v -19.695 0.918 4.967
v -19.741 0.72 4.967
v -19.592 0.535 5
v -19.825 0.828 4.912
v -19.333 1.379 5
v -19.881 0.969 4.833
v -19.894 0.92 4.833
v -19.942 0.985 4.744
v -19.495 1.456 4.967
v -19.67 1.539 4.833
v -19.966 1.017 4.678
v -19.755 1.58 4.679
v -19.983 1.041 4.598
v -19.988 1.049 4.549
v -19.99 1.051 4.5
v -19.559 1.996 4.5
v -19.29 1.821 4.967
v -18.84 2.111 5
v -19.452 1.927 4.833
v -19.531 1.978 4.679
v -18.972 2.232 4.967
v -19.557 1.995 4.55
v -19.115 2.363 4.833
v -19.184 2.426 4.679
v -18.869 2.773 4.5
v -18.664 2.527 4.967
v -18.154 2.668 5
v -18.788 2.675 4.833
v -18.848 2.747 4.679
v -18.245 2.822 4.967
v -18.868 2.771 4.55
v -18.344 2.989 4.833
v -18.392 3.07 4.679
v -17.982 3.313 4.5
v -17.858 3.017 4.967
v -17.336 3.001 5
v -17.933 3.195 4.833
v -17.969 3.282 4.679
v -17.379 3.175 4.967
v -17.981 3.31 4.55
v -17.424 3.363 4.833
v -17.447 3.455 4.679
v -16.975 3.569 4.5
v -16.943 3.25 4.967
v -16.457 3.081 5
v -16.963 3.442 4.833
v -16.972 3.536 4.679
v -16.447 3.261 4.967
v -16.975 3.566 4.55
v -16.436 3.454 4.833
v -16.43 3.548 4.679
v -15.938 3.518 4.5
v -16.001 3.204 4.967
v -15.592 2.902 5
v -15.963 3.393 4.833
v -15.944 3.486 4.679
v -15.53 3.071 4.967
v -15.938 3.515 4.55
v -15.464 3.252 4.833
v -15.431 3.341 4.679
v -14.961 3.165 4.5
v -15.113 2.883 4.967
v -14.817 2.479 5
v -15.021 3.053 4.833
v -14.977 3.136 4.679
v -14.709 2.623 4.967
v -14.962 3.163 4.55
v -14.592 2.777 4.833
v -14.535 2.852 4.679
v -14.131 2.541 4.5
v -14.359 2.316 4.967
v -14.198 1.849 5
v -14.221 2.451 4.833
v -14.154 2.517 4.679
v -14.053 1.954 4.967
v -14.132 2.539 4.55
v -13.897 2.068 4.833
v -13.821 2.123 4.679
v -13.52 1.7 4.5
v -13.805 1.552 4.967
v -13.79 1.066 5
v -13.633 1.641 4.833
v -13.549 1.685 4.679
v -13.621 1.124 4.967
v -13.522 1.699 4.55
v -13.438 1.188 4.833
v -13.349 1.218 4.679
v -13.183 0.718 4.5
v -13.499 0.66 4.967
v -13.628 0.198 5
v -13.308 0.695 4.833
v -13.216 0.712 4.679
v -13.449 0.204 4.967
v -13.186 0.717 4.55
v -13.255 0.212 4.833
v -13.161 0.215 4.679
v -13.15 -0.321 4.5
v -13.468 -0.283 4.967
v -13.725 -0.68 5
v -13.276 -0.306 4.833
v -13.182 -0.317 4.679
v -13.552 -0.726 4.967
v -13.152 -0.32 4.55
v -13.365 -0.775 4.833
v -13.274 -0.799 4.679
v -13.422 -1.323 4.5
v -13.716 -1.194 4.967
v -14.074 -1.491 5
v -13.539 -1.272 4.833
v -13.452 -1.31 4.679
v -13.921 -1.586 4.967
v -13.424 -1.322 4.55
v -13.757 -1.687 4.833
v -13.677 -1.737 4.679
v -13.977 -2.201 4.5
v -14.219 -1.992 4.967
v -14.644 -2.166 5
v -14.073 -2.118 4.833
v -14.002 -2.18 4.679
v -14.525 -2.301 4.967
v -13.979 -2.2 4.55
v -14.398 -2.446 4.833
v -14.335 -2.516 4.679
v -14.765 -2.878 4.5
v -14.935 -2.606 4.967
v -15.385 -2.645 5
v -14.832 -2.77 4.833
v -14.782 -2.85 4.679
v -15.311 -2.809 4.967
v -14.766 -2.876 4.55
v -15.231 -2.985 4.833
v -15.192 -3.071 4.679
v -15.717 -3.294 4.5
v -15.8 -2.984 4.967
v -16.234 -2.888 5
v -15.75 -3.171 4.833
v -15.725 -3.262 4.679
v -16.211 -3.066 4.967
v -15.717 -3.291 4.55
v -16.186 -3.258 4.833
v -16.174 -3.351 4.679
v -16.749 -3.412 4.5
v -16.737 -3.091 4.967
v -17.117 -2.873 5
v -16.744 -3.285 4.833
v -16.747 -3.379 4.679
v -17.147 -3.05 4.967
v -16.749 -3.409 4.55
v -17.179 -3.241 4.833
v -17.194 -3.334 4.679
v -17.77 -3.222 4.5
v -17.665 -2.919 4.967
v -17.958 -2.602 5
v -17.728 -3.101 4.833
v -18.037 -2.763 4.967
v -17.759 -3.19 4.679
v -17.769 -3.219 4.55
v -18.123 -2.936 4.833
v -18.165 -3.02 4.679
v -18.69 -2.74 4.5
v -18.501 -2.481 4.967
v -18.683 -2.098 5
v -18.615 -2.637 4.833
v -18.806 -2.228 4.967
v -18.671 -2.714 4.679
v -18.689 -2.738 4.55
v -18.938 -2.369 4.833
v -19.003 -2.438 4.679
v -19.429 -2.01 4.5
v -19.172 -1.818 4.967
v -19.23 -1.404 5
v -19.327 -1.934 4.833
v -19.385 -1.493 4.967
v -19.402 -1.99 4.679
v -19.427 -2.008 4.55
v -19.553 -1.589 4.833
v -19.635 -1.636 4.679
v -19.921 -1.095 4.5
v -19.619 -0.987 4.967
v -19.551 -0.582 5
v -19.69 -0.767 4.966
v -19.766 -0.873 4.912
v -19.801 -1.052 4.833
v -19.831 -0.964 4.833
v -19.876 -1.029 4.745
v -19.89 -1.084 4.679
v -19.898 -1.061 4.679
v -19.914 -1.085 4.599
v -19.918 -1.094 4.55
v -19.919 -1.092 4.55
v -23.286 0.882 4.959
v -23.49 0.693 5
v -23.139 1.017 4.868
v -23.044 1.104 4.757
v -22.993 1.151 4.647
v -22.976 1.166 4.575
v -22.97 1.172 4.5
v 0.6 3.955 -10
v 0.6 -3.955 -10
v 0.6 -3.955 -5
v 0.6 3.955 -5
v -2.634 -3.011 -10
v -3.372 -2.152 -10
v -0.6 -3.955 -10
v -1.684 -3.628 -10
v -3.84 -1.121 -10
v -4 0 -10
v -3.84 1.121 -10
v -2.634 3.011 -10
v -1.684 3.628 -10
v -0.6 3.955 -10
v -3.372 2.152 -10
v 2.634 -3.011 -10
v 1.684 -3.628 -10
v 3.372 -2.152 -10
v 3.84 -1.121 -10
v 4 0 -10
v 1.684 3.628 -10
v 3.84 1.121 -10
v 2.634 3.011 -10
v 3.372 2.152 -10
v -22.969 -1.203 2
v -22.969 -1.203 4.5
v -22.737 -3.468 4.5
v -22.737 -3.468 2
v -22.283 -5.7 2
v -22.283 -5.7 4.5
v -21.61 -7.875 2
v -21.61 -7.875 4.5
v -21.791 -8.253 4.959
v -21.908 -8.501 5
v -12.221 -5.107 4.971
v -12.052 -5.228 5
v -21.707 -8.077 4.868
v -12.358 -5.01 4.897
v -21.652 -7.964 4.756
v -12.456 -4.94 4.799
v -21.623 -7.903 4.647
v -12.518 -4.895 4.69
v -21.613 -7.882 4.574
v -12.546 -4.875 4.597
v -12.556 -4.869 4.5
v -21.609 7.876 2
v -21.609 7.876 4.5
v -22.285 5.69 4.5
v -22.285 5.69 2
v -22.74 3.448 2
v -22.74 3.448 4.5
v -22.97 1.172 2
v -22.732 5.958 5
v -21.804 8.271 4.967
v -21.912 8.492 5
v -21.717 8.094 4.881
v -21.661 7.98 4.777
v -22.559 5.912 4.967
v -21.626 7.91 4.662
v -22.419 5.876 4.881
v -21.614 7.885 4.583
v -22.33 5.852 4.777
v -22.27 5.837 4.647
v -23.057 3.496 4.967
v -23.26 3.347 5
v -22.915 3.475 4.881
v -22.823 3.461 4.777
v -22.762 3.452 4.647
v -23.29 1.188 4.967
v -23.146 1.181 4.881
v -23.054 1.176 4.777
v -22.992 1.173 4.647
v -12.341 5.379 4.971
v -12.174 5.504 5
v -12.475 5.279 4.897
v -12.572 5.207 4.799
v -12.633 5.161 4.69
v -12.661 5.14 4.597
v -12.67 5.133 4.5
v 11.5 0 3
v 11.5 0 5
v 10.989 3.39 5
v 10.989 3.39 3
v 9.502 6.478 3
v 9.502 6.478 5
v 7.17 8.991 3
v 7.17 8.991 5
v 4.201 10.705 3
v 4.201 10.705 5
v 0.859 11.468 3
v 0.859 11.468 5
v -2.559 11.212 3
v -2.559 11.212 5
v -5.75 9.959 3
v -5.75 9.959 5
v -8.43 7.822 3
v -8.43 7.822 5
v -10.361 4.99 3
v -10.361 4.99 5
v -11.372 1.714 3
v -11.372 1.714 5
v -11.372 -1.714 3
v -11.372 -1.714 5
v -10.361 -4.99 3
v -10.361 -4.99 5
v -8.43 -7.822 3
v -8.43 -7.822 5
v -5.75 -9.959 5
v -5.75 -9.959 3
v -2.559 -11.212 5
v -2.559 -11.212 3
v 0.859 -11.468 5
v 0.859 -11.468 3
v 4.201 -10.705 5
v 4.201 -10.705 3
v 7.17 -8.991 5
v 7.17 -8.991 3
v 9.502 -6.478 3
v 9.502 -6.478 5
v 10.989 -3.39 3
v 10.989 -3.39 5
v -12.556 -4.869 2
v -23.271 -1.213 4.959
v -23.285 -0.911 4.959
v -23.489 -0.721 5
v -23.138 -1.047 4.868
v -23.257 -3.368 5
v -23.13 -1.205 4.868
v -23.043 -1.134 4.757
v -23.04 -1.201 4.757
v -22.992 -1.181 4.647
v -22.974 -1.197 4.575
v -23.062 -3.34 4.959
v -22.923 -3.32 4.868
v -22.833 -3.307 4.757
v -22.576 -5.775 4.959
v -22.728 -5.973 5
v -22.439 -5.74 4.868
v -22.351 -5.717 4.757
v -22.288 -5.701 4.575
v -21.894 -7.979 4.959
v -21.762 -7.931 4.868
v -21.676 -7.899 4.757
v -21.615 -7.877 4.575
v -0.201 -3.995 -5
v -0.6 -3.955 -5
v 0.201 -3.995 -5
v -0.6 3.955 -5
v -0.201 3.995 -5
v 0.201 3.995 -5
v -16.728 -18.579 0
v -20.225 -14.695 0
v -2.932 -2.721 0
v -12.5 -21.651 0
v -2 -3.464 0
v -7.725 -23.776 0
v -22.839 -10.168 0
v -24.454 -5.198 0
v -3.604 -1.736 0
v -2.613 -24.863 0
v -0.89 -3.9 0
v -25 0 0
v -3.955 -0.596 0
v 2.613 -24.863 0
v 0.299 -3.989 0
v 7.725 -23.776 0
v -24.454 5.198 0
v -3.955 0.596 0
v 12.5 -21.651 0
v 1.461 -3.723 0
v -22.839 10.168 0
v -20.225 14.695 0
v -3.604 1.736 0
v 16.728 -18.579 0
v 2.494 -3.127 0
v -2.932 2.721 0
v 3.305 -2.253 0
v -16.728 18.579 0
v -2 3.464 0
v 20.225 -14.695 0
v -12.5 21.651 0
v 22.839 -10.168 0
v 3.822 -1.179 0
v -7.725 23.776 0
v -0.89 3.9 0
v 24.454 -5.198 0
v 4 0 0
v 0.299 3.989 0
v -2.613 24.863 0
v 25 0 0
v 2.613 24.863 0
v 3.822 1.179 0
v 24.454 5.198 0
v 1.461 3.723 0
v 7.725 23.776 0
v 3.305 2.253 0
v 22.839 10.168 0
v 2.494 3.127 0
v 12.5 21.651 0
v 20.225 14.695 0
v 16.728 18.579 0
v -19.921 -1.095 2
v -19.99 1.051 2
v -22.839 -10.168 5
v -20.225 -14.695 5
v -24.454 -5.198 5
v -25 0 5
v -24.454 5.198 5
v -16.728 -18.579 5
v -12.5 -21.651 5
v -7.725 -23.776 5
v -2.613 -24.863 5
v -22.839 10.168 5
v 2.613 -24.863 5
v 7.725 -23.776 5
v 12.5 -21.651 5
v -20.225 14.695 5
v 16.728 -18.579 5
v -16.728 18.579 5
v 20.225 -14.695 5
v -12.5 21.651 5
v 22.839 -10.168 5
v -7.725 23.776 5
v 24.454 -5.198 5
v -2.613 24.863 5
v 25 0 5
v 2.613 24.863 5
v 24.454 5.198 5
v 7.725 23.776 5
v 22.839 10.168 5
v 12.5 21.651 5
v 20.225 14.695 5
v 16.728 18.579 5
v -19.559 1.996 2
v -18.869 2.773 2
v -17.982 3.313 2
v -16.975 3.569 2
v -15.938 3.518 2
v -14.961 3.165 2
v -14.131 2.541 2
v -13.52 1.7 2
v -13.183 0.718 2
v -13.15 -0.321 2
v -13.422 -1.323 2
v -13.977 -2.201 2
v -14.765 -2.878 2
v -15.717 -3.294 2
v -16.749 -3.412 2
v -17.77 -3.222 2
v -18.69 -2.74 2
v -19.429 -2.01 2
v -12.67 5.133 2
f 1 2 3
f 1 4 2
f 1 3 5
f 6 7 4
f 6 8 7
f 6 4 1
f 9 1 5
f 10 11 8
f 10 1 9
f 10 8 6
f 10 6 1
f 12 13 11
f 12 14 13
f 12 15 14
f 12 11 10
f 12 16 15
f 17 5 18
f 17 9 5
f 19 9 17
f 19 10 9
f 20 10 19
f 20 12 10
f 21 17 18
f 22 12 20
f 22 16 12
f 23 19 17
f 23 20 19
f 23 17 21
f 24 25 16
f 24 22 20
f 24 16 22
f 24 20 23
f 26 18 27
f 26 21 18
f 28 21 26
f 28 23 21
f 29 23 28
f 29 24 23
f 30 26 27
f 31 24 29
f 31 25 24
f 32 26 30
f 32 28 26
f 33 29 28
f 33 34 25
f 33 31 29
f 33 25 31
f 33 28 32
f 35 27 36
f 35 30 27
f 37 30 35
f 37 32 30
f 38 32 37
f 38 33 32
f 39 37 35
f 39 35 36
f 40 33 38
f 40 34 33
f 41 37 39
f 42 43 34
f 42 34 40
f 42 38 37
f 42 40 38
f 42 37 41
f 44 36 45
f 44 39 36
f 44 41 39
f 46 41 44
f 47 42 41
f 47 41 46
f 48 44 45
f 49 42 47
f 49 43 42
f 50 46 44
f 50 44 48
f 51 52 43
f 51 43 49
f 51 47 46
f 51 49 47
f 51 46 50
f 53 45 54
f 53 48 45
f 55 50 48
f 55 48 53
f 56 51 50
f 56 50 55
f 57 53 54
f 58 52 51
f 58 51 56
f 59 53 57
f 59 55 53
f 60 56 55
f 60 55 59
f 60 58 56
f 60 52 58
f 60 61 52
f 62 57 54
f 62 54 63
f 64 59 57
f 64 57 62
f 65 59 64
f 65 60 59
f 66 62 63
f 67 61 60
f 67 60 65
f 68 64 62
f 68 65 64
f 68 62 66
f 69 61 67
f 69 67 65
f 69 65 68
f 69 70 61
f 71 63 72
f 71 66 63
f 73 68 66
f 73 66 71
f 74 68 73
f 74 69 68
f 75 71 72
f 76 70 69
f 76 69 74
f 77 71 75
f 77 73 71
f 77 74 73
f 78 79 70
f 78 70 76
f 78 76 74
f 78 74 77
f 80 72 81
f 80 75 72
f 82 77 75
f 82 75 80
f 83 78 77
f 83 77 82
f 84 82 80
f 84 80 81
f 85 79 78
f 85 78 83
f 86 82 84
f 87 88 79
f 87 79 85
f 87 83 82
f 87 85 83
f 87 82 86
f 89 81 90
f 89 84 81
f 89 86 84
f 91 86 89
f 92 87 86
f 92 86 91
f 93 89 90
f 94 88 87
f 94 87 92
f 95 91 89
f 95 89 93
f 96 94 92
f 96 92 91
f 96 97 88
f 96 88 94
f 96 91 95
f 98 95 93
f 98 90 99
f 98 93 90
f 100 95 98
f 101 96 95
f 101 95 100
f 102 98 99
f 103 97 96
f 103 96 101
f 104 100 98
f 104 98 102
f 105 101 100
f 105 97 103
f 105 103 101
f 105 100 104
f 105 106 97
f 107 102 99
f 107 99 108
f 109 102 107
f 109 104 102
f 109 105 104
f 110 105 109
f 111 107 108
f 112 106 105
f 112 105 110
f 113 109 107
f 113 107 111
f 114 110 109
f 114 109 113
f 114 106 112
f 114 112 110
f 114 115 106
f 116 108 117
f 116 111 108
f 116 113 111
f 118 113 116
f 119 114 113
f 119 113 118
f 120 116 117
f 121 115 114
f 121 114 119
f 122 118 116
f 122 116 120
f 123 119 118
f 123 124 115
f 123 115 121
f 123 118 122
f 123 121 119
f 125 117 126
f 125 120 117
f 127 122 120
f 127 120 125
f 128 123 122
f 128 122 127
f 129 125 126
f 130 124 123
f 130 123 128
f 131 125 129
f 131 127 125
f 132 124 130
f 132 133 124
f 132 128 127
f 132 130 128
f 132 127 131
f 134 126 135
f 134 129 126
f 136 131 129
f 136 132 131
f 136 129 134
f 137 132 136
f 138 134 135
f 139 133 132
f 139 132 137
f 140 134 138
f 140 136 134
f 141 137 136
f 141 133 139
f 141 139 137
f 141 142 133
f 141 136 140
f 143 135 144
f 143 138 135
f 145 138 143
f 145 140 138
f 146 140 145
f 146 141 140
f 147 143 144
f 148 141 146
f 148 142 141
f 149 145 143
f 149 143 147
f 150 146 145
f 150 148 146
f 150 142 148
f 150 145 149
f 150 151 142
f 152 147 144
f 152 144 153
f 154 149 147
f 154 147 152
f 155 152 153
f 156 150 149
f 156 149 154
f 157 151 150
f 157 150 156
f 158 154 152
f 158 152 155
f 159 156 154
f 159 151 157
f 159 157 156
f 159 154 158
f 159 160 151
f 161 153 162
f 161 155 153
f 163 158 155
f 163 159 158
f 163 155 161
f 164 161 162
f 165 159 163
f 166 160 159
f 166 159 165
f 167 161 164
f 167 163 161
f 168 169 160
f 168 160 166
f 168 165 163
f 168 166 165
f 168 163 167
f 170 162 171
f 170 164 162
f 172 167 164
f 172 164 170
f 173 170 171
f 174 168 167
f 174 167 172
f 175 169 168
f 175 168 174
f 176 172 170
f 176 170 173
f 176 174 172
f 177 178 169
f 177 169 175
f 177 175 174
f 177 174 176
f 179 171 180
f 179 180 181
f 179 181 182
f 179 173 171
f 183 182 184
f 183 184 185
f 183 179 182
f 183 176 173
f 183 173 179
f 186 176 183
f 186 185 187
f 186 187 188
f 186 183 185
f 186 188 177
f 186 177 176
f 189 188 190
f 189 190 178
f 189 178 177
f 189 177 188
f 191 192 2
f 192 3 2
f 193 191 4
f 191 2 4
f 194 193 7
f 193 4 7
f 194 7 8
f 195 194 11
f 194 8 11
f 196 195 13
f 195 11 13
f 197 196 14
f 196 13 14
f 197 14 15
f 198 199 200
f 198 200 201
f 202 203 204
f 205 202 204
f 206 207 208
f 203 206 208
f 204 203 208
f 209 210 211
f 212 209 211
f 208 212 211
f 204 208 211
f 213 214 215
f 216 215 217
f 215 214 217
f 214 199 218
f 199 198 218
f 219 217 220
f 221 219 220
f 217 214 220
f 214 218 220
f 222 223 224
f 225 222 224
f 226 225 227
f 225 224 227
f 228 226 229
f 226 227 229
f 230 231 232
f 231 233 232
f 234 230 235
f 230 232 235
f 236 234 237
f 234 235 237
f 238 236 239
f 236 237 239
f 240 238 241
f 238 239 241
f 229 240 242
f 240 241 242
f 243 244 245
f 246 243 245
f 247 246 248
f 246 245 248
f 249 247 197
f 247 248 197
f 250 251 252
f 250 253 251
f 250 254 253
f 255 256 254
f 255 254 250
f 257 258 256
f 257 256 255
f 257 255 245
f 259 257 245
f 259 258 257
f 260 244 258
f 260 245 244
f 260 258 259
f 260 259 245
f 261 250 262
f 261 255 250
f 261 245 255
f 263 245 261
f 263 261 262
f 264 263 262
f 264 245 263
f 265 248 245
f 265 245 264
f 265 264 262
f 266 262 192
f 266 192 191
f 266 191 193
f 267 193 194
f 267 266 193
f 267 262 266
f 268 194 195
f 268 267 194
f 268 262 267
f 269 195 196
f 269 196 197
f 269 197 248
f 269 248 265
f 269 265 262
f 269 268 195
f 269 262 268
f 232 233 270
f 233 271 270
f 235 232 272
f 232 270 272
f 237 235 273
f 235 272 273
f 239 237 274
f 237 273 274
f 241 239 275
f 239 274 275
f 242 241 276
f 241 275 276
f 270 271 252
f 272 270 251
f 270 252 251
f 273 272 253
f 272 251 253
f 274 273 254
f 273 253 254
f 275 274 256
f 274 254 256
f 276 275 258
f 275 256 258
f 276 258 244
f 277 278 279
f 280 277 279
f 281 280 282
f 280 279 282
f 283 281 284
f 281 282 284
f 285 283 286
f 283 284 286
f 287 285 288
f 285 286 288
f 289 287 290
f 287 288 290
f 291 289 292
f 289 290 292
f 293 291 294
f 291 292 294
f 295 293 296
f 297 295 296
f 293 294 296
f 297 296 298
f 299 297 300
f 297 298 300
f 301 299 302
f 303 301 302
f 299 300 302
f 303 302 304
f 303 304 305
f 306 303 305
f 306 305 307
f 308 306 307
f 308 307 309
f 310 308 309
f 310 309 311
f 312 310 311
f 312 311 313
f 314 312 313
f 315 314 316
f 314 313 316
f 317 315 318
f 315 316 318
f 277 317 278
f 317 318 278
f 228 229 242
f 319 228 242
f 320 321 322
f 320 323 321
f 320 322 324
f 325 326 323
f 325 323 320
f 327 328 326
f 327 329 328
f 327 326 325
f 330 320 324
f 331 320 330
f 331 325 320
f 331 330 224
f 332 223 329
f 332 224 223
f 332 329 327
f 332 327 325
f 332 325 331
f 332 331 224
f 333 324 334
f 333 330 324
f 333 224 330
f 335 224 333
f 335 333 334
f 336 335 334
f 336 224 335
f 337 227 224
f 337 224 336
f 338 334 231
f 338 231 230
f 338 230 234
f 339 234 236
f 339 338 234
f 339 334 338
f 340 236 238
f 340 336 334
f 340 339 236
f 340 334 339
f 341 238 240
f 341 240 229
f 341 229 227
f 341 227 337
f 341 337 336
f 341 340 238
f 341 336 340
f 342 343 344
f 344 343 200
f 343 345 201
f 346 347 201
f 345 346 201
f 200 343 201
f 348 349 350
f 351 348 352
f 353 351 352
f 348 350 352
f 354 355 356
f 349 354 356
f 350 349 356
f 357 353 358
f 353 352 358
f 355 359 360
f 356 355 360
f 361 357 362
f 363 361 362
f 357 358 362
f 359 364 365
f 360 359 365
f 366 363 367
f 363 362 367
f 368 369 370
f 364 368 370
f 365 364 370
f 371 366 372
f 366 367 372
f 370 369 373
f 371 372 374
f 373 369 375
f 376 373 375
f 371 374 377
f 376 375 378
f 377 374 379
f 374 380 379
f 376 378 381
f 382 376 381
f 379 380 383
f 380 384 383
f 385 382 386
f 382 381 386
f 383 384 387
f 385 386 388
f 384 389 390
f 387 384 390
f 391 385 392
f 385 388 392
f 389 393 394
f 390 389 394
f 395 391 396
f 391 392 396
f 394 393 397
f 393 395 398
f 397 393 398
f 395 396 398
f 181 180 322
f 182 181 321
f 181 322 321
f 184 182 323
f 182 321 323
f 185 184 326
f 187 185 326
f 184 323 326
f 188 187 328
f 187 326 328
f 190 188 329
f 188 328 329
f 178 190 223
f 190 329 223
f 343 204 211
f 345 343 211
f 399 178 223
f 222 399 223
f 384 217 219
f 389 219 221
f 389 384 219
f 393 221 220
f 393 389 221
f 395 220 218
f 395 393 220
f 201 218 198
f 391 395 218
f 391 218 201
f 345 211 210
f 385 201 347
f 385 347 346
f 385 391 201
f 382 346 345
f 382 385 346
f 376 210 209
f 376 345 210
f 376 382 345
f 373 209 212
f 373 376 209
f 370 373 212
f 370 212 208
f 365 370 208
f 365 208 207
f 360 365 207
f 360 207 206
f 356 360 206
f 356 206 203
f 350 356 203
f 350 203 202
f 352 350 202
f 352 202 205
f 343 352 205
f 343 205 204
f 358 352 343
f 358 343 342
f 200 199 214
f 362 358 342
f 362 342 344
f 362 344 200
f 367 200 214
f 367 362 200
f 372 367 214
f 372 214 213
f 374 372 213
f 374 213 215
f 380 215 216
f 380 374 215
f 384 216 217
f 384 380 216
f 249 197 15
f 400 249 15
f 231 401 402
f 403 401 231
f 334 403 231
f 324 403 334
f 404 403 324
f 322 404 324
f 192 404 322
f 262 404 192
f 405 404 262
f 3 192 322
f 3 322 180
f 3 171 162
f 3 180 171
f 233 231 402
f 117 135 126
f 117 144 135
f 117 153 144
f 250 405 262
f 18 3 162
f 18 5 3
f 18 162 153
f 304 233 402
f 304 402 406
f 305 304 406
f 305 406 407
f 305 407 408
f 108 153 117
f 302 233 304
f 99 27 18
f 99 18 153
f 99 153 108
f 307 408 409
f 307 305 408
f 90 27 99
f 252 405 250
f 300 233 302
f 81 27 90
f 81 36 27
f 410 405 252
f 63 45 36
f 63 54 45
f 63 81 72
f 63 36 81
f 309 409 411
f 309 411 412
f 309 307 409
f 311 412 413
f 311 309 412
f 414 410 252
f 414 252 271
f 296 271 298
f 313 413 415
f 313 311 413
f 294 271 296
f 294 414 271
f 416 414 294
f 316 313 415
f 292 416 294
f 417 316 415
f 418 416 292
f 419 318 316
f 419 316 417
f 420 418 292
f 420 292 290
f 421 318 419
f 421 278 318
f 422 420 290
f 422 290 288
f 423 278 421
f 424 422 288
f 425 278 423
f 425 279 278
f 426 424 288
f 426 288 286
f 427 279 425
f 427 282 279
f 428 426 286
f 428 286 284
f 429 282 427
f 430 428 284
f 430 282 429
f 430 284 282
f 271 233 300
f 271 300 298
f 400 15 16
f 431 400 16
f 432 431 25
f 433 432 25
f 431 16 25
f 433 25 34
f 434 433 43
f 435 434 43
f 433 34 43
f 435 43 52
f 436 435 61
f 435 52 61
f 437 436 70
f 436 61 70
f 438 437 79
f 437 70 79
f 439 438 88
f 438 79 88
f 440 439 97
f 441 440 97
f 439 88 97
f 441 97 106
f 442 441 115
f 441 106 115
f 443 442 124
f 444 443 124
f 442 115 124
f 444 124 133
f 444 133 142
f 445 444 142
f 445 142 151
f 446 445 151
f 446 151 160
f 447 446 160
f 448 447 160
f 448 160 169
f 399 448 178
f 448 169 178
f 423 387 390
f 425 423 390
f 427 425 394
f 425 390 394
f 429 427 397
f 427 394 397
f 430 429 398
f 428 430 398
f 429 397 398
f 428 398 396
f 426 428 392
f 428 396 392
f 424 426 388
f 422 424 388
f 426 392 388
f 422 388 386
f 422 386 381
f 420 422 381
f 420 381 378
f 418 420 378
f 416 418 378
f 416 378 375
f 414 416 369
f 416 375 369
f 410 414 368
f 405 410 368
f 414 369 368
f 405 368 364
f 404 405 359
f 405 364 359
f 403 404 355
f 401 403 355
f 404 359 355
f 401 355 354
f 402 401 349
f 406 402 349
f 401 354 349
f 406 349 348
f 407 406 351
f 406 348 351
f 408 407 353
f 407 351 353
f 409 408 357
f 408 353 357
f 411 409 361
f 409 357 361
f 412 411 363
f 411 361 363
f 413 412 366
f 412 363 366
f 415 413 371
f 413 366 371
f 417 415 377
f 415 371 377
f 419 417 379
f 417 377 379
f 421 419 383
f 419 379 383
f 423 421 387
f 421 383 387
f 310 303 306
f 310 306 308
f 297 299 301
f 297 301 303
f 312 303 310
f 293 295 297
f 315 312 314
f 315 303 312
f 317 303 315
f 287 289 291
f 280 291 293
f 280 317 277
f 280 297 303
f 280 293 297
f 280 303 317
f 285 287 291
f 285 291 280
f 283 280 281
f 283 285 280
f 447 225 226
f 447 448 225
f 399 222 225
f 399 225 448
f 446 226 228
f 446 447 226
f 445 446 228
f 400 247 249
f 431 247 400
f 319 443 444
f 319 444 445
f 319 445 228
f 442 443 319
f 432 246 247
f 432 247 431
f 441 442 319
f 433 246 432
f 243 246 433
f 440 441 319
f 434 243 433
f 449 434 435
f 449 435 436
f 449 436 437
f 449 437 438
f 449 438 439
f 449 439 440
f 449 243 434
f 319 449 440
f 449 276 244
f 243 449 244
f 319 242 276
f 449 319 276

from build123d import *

# Parameters (mm, degrees)
SKETCH1_R           = 25
BOSS_EXTRUDE1_DEPTH = 5
CUT_EXTRUDE1_START  = 5
CUT_EXTRUDE1_DEPTH  = 3
CUT_EXTRUDE2_START  = 5
SKETCH3_R           = 11.5
CUT_EXTRUDE2_DEPTH  = 2
SKETCH4_R           = 4
BOSS_EXTRUDE2_DEPTH = 10
CUT_EXTRUDE3_START  = -10
SKETCH5_W           = 1.2
SKETCH5_H           = 10
CUT_EXTRUDE3_DEPTH  = 5
FILLET1_R           = 0.5


with BuildPart() as part:
    # Sketch1 → Boss-Extrude1 (new body)
    with BuildSketch(Plane.XY):
        Circle(SKETCH1_R)
    extrude(amount=BOSS_EXTRUDE1_DEPTH)

    # Sketch2 → Cut-Extrude1 (cut)
    with BuildSketch(Plane.XY.offset(CUT_EXTRUDE1_START)):
        with BuildLine():
            Line((-19.920587104, -1.094962553), (-22.96853355, -1.202691377))
            ThreePointArc((-22.96853355, -1.202691377), (-22.537445492, -4.589504406), (-21.609752304, -7.875189228))
            Line((-21.609752304, -7.875189228), (-12.555769306, -4.868581062))
            Line((-12.555769306, -4.868581062), (-12.669871245, 5.133277845))
            Line((-12.669871245, 5.133277845), (-21.609327517, 7.876354758))
            ThreePointArc((-21.609327517, 7.876354758), (-22.540397078, 4.574986289), (-22.970127121, 1.171861786))
            Line((-22.970127121, 1.171861786), (-19.990271583, 1.051061802))
            ThreePointArc((-19.990271583, 1.051061802), (-13.12774726, 0.199754222), (-19.920587104, -1.094962553))
        make_face()
    extrude(amount=-CUT_EXTRUDE1_DEPTH, mode=Mode.SUBTRACT)

    # Sketch3 → Cut-Extrude2 (cut)
    with BuildSketch(Plane.XY.offset(CUT_EXTRUDE2_START)):
        Circle(SKETCH3_R)
    extrude(amount=-CUT_EXTRUDE2_DEPTH, mode=Mode.SUBTRACT)

    # Sketch4 → Boss-Extrude2 (add)
    with BuildSketch(Plane.XY):
        Circle(SKETCH4_R)
    extrude(amount=-BOSS_EXTRUDE2_DEPTH)

    # Sketch5 → Cut-Extrude3 (cut)
    with BuildSketch(Plane.XY.offset(CUT_EXTRUDE3_START)):
        Rectangle(SKETCH5_W, SKETCH5_H)
    extrude(amount=CUT_EXTRUDE3_DEPTH, mode=Mode.SUBTRACT)

    # Fillet1
    fillet1_edges = [part.edges().sort_by_distance(p)[0] for p in [
        (-17.082760805, -6.371885145, 5),
        (-21.444560327, -1.148826965, 5),
        (-13.12774726, 0.199754222, 5),
        (-21.480199352, 1.111461794, 5),
        (-22.540397078, 4.574986289, 5),
        (-22.537445492, -4.589504406, 5),
        (-17.139599381, 6.504816302, 5),
        (-12.612820275, 0.132348391, 5),
    ]]
    fillet(fillet1_edges, radius=FILLET1_R)


solid = part.part
